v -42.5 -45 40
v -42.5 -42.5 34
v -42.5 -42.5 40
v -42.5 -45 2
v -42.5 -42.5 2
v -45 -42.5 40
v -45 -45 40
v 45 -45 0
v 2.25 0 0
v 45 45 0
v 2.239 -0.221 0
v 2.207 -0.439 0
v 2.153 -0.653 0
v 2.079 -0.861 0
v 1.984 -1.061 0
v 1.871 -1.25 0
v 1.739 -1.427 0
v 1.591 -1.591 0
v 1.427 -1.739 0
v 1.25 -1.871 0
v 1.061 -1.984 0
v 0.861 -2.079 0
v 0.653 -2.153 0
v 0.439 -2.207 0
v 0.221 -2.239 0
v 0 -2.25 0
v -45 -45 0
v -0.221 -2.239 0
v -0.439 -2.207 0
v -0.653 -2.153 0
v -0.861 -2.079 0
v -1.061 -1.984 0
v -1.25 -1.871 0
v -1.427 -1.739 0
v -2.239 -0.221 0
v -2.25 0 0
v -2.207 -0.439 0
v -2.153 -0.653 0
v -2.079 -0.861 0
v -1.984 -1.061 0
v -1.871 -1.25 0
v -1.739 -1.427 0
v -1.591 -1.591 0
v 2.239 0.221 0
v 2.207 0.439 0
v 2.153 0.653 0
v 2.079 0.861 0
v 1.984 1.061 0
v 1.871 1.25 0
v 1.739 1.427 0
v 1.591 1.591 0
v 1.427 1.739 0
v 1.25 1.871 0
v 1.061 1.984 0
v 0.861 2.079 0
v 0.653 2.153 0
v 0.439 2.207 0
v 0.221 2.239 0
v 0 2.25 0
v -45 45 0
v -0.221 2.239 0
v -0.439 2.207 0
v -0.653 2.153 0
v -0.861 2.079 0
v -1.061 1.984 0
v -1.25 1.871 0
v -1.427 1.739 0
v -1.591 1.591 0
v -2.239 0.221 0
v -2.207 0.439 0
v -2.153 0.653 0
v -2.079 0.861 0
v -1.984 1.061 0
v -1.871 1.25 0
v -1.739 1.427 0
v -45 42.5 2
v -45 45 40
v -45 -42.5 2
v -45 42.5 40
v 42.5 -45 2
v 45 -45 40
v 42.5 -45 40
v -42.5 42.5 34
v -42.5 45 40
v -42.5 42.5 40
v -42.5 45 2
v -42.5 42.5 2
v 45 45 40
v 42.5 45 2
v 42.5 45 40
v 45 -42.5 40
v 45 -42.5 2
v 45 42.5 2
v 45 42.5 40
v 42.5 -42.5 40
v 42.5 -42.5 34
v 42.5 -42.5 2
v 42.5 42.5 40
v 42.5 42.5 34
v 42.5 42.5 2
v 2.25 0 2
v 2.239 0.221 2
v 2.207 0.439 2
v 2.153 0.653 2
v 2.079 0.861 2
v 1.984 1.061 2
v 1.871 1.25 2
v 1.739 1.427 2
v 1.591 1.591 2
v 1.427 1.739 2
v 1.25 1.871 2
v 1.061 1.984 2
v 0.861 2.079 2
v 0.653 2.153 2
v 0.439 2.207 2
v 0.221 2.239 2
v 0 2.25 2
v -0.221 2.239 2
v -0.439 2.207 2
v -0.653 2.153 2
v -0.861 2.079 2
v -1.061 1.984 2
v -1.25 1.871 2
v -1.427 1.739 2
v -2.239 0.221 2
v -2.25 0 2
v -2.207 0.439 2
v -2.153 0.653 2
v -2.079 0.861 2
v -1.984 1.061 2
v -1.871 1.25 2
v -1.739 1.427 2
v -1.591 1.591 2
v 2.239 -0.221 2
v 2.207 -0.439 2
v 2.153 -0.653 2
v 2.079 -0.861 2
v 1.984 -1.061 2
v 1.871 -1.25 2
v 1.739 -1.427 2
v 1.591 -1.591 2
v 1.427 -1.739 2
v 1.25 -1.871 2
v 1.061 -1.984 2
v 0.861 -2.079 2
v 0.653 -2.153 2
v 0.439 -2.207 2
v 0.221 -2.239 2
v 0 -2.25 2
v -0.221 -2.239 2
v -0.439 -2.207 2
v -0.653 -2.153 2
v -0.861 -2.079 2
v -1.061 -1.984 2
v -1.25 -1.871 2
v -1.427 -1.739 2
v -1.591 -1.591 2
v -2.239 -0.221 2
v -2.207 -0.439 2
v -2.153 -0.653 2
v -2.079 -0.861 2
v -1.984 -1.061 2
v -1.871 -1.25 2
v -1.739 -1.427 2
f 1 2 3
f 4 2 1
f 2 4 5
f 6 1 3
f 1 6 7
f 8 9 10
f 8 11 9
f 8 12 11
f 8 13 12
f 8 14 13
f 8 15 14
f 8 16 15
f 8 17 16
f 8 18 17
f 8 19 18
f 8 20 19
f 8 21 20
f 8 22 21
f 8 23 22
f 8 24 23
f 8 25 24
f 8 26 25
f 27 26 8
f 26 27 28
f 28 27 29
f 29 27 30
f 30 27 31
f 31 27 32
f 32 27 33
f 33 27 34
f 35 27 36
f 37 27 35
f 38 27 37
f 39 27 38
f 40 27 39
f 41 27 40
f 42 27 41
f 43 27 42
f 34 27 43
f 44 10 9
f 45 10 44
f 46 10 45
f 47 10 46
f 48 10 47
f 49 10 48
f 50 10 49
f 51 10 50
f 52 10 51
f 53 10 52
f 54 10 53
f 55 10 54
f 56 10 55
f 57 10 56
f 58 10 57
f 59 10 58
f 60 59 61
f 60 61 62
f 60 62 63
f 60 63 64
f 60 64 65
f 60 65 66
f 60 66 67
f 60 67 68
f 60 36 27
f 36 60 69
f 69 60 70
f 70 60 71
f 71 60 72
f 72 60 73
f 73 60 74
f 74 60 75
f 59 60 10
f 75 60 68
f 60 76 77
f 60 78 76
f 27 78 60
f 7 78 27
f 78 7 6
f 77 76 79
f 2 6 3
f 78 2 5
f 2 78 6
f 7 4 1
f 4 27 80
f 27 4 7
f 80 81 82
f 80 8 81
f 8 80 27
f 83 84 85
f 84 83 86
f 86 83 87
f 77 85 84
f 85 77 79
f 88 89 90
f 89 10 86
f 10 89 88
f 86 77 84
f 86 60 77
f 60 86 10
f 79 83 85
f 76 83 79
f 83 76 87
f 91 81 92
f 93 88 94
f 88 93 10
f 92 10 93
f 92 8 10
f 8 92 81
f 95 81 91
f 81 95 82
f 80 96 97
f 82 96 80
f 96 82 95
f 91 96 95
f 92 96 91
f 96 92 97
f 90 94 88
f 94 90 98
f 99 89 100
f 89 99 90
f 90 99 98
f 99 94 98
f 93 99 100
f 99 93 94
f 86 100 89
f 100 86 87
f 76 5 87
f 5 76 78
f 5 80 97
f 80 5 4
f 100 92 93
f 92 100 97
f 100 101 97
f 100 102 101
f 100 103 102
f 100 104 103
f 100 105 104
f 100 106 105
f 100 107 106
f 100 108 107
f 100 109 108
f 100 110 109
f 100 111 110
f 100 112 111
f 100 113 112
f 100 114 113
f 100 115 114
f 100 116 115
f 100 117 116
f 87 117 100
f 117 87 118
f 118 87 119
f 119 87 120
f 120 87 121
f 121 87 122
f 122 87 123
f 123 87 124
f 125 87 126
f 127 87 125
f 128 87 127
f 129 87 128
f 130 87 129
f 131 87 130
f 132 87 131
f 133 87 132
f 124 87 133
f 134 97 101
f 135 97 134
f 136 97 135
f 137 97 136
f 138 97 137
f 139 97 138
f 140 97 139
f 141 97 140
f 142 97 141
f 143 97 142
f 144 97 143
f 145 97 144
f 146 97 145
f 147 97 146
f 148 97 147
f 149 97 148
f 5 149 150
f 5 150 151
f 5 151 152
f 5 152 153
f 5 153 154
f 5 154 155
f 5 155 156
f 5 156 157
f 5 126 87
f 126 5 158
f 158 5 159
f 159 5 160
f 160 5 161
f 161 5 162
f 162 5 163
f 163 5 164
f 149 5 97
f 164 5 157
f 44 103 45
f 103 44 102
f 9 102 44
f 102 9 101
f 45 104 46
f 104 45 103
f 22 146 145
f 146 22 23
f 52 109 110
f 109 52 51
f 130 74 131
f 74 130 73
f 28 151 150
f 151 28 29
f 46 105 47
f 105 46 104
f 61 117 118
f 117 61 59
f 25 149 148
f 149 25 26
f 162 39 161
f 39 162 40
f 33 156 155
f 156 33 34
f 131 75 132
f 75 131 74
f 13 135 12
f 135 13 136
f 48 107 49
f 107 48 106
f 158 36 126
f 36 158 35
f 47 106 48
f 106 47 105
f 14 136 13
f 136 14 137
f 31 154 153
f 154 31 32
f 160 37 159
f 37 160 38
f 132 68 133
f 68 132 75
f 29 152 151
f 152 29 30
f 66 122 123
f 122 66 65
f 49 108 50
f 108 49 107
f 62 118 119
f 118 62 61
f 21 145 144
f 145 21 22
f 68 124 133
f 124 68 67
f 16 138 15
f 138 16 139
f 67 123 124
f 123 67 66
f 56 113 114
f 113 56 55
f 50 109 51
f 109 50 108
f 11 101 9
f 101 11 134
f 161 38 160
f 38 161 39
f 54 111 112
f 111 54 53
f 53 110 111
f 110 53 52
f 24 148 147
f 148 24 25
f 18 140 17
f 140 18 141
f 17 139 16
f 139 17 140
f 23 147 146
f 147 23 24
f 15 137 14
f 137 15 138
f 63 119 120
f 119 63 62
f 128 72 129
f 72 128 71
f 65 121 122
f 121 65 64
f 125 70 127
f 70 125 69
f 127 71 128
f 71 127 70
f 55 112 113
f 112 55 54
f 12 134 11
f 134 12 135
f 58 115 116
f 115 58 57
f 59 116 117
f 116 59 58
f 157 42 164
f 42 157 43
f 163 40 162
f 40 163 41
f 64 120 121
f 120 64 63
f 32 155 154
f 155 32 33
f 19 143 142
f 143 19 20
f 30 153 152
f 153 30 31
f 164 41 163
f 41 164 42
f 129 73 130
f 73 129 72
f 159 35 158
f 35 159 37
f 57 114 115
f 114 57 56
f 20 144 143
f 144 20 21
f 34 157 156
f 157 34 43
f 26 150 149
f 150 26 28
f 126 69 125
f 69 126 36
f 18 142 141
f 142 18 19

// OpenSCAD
// Magnetic stirrer housing - upside-down open box over a 80 mm PC fan
// Print orientation: top plate on the bed (z = 0), walls rise to z = 40

// ---------- Parameters ----------
outer_x      = 90;    // outer size in X (mm)
outer_y      = 90;    // outer size in Y (mm)
top_t        = 2;     // top plate thickness (mm)
wall_t       = 2.5;   // wall thickness (mm)
wall_h       = 40;    // wall height from top plate (mm) -> z = 40
hole_d       = 4.5;   // M4 screw hole diameter (mm)
hole_pitch   = 71.5;  // square pattern pitch of holes (mm)
notch_w      = 12;    // cable notch width (mm)
notch_bottom = 8;     // notch depth from open edge (mm) -> z = 32
eps          = 0.5;   // cutter overshoot past faces (mm)

$fn = 64;

// ---------- Model ----------
difference() {
    // Solid body: top plate + four walls, open top
    union() {
        translate([-outer_x/2, -outer_y/2, 0])
            cube([outer_x, outer_y, top_t]);
        for (sx = [-1, 1], sy = [-1, 1])
            translate([sx > 0 ? outer_x/2 - wall_t : -outer_x/2,
                       sy > 0 ? outer_y/2 - wall_t : -outer_y/2,
                       0])
                cube([wall_t, wall_t, wall_h]);
    }

    // Four M4 screw holes through the top plate, centred on the plate
    for (i = [0 : 3])
        translate([0, 0, -eps])
            rotate([0, 0, i * 90])
                cylinder(d = hole_d, h = top_t + 2*eps);

    // Cable notch in one wall: 12 mm wide, centred along the wall,
    // from z = 32 up to the open edge (z = 40)
    translate([-outer_x/2 + wall_t, -outer_y/2 + wall_t, top_t])
        cube([outer_x - 2*wall_t, outer_y - 2*wall_t, wall_h - notch_bottom]);
}
